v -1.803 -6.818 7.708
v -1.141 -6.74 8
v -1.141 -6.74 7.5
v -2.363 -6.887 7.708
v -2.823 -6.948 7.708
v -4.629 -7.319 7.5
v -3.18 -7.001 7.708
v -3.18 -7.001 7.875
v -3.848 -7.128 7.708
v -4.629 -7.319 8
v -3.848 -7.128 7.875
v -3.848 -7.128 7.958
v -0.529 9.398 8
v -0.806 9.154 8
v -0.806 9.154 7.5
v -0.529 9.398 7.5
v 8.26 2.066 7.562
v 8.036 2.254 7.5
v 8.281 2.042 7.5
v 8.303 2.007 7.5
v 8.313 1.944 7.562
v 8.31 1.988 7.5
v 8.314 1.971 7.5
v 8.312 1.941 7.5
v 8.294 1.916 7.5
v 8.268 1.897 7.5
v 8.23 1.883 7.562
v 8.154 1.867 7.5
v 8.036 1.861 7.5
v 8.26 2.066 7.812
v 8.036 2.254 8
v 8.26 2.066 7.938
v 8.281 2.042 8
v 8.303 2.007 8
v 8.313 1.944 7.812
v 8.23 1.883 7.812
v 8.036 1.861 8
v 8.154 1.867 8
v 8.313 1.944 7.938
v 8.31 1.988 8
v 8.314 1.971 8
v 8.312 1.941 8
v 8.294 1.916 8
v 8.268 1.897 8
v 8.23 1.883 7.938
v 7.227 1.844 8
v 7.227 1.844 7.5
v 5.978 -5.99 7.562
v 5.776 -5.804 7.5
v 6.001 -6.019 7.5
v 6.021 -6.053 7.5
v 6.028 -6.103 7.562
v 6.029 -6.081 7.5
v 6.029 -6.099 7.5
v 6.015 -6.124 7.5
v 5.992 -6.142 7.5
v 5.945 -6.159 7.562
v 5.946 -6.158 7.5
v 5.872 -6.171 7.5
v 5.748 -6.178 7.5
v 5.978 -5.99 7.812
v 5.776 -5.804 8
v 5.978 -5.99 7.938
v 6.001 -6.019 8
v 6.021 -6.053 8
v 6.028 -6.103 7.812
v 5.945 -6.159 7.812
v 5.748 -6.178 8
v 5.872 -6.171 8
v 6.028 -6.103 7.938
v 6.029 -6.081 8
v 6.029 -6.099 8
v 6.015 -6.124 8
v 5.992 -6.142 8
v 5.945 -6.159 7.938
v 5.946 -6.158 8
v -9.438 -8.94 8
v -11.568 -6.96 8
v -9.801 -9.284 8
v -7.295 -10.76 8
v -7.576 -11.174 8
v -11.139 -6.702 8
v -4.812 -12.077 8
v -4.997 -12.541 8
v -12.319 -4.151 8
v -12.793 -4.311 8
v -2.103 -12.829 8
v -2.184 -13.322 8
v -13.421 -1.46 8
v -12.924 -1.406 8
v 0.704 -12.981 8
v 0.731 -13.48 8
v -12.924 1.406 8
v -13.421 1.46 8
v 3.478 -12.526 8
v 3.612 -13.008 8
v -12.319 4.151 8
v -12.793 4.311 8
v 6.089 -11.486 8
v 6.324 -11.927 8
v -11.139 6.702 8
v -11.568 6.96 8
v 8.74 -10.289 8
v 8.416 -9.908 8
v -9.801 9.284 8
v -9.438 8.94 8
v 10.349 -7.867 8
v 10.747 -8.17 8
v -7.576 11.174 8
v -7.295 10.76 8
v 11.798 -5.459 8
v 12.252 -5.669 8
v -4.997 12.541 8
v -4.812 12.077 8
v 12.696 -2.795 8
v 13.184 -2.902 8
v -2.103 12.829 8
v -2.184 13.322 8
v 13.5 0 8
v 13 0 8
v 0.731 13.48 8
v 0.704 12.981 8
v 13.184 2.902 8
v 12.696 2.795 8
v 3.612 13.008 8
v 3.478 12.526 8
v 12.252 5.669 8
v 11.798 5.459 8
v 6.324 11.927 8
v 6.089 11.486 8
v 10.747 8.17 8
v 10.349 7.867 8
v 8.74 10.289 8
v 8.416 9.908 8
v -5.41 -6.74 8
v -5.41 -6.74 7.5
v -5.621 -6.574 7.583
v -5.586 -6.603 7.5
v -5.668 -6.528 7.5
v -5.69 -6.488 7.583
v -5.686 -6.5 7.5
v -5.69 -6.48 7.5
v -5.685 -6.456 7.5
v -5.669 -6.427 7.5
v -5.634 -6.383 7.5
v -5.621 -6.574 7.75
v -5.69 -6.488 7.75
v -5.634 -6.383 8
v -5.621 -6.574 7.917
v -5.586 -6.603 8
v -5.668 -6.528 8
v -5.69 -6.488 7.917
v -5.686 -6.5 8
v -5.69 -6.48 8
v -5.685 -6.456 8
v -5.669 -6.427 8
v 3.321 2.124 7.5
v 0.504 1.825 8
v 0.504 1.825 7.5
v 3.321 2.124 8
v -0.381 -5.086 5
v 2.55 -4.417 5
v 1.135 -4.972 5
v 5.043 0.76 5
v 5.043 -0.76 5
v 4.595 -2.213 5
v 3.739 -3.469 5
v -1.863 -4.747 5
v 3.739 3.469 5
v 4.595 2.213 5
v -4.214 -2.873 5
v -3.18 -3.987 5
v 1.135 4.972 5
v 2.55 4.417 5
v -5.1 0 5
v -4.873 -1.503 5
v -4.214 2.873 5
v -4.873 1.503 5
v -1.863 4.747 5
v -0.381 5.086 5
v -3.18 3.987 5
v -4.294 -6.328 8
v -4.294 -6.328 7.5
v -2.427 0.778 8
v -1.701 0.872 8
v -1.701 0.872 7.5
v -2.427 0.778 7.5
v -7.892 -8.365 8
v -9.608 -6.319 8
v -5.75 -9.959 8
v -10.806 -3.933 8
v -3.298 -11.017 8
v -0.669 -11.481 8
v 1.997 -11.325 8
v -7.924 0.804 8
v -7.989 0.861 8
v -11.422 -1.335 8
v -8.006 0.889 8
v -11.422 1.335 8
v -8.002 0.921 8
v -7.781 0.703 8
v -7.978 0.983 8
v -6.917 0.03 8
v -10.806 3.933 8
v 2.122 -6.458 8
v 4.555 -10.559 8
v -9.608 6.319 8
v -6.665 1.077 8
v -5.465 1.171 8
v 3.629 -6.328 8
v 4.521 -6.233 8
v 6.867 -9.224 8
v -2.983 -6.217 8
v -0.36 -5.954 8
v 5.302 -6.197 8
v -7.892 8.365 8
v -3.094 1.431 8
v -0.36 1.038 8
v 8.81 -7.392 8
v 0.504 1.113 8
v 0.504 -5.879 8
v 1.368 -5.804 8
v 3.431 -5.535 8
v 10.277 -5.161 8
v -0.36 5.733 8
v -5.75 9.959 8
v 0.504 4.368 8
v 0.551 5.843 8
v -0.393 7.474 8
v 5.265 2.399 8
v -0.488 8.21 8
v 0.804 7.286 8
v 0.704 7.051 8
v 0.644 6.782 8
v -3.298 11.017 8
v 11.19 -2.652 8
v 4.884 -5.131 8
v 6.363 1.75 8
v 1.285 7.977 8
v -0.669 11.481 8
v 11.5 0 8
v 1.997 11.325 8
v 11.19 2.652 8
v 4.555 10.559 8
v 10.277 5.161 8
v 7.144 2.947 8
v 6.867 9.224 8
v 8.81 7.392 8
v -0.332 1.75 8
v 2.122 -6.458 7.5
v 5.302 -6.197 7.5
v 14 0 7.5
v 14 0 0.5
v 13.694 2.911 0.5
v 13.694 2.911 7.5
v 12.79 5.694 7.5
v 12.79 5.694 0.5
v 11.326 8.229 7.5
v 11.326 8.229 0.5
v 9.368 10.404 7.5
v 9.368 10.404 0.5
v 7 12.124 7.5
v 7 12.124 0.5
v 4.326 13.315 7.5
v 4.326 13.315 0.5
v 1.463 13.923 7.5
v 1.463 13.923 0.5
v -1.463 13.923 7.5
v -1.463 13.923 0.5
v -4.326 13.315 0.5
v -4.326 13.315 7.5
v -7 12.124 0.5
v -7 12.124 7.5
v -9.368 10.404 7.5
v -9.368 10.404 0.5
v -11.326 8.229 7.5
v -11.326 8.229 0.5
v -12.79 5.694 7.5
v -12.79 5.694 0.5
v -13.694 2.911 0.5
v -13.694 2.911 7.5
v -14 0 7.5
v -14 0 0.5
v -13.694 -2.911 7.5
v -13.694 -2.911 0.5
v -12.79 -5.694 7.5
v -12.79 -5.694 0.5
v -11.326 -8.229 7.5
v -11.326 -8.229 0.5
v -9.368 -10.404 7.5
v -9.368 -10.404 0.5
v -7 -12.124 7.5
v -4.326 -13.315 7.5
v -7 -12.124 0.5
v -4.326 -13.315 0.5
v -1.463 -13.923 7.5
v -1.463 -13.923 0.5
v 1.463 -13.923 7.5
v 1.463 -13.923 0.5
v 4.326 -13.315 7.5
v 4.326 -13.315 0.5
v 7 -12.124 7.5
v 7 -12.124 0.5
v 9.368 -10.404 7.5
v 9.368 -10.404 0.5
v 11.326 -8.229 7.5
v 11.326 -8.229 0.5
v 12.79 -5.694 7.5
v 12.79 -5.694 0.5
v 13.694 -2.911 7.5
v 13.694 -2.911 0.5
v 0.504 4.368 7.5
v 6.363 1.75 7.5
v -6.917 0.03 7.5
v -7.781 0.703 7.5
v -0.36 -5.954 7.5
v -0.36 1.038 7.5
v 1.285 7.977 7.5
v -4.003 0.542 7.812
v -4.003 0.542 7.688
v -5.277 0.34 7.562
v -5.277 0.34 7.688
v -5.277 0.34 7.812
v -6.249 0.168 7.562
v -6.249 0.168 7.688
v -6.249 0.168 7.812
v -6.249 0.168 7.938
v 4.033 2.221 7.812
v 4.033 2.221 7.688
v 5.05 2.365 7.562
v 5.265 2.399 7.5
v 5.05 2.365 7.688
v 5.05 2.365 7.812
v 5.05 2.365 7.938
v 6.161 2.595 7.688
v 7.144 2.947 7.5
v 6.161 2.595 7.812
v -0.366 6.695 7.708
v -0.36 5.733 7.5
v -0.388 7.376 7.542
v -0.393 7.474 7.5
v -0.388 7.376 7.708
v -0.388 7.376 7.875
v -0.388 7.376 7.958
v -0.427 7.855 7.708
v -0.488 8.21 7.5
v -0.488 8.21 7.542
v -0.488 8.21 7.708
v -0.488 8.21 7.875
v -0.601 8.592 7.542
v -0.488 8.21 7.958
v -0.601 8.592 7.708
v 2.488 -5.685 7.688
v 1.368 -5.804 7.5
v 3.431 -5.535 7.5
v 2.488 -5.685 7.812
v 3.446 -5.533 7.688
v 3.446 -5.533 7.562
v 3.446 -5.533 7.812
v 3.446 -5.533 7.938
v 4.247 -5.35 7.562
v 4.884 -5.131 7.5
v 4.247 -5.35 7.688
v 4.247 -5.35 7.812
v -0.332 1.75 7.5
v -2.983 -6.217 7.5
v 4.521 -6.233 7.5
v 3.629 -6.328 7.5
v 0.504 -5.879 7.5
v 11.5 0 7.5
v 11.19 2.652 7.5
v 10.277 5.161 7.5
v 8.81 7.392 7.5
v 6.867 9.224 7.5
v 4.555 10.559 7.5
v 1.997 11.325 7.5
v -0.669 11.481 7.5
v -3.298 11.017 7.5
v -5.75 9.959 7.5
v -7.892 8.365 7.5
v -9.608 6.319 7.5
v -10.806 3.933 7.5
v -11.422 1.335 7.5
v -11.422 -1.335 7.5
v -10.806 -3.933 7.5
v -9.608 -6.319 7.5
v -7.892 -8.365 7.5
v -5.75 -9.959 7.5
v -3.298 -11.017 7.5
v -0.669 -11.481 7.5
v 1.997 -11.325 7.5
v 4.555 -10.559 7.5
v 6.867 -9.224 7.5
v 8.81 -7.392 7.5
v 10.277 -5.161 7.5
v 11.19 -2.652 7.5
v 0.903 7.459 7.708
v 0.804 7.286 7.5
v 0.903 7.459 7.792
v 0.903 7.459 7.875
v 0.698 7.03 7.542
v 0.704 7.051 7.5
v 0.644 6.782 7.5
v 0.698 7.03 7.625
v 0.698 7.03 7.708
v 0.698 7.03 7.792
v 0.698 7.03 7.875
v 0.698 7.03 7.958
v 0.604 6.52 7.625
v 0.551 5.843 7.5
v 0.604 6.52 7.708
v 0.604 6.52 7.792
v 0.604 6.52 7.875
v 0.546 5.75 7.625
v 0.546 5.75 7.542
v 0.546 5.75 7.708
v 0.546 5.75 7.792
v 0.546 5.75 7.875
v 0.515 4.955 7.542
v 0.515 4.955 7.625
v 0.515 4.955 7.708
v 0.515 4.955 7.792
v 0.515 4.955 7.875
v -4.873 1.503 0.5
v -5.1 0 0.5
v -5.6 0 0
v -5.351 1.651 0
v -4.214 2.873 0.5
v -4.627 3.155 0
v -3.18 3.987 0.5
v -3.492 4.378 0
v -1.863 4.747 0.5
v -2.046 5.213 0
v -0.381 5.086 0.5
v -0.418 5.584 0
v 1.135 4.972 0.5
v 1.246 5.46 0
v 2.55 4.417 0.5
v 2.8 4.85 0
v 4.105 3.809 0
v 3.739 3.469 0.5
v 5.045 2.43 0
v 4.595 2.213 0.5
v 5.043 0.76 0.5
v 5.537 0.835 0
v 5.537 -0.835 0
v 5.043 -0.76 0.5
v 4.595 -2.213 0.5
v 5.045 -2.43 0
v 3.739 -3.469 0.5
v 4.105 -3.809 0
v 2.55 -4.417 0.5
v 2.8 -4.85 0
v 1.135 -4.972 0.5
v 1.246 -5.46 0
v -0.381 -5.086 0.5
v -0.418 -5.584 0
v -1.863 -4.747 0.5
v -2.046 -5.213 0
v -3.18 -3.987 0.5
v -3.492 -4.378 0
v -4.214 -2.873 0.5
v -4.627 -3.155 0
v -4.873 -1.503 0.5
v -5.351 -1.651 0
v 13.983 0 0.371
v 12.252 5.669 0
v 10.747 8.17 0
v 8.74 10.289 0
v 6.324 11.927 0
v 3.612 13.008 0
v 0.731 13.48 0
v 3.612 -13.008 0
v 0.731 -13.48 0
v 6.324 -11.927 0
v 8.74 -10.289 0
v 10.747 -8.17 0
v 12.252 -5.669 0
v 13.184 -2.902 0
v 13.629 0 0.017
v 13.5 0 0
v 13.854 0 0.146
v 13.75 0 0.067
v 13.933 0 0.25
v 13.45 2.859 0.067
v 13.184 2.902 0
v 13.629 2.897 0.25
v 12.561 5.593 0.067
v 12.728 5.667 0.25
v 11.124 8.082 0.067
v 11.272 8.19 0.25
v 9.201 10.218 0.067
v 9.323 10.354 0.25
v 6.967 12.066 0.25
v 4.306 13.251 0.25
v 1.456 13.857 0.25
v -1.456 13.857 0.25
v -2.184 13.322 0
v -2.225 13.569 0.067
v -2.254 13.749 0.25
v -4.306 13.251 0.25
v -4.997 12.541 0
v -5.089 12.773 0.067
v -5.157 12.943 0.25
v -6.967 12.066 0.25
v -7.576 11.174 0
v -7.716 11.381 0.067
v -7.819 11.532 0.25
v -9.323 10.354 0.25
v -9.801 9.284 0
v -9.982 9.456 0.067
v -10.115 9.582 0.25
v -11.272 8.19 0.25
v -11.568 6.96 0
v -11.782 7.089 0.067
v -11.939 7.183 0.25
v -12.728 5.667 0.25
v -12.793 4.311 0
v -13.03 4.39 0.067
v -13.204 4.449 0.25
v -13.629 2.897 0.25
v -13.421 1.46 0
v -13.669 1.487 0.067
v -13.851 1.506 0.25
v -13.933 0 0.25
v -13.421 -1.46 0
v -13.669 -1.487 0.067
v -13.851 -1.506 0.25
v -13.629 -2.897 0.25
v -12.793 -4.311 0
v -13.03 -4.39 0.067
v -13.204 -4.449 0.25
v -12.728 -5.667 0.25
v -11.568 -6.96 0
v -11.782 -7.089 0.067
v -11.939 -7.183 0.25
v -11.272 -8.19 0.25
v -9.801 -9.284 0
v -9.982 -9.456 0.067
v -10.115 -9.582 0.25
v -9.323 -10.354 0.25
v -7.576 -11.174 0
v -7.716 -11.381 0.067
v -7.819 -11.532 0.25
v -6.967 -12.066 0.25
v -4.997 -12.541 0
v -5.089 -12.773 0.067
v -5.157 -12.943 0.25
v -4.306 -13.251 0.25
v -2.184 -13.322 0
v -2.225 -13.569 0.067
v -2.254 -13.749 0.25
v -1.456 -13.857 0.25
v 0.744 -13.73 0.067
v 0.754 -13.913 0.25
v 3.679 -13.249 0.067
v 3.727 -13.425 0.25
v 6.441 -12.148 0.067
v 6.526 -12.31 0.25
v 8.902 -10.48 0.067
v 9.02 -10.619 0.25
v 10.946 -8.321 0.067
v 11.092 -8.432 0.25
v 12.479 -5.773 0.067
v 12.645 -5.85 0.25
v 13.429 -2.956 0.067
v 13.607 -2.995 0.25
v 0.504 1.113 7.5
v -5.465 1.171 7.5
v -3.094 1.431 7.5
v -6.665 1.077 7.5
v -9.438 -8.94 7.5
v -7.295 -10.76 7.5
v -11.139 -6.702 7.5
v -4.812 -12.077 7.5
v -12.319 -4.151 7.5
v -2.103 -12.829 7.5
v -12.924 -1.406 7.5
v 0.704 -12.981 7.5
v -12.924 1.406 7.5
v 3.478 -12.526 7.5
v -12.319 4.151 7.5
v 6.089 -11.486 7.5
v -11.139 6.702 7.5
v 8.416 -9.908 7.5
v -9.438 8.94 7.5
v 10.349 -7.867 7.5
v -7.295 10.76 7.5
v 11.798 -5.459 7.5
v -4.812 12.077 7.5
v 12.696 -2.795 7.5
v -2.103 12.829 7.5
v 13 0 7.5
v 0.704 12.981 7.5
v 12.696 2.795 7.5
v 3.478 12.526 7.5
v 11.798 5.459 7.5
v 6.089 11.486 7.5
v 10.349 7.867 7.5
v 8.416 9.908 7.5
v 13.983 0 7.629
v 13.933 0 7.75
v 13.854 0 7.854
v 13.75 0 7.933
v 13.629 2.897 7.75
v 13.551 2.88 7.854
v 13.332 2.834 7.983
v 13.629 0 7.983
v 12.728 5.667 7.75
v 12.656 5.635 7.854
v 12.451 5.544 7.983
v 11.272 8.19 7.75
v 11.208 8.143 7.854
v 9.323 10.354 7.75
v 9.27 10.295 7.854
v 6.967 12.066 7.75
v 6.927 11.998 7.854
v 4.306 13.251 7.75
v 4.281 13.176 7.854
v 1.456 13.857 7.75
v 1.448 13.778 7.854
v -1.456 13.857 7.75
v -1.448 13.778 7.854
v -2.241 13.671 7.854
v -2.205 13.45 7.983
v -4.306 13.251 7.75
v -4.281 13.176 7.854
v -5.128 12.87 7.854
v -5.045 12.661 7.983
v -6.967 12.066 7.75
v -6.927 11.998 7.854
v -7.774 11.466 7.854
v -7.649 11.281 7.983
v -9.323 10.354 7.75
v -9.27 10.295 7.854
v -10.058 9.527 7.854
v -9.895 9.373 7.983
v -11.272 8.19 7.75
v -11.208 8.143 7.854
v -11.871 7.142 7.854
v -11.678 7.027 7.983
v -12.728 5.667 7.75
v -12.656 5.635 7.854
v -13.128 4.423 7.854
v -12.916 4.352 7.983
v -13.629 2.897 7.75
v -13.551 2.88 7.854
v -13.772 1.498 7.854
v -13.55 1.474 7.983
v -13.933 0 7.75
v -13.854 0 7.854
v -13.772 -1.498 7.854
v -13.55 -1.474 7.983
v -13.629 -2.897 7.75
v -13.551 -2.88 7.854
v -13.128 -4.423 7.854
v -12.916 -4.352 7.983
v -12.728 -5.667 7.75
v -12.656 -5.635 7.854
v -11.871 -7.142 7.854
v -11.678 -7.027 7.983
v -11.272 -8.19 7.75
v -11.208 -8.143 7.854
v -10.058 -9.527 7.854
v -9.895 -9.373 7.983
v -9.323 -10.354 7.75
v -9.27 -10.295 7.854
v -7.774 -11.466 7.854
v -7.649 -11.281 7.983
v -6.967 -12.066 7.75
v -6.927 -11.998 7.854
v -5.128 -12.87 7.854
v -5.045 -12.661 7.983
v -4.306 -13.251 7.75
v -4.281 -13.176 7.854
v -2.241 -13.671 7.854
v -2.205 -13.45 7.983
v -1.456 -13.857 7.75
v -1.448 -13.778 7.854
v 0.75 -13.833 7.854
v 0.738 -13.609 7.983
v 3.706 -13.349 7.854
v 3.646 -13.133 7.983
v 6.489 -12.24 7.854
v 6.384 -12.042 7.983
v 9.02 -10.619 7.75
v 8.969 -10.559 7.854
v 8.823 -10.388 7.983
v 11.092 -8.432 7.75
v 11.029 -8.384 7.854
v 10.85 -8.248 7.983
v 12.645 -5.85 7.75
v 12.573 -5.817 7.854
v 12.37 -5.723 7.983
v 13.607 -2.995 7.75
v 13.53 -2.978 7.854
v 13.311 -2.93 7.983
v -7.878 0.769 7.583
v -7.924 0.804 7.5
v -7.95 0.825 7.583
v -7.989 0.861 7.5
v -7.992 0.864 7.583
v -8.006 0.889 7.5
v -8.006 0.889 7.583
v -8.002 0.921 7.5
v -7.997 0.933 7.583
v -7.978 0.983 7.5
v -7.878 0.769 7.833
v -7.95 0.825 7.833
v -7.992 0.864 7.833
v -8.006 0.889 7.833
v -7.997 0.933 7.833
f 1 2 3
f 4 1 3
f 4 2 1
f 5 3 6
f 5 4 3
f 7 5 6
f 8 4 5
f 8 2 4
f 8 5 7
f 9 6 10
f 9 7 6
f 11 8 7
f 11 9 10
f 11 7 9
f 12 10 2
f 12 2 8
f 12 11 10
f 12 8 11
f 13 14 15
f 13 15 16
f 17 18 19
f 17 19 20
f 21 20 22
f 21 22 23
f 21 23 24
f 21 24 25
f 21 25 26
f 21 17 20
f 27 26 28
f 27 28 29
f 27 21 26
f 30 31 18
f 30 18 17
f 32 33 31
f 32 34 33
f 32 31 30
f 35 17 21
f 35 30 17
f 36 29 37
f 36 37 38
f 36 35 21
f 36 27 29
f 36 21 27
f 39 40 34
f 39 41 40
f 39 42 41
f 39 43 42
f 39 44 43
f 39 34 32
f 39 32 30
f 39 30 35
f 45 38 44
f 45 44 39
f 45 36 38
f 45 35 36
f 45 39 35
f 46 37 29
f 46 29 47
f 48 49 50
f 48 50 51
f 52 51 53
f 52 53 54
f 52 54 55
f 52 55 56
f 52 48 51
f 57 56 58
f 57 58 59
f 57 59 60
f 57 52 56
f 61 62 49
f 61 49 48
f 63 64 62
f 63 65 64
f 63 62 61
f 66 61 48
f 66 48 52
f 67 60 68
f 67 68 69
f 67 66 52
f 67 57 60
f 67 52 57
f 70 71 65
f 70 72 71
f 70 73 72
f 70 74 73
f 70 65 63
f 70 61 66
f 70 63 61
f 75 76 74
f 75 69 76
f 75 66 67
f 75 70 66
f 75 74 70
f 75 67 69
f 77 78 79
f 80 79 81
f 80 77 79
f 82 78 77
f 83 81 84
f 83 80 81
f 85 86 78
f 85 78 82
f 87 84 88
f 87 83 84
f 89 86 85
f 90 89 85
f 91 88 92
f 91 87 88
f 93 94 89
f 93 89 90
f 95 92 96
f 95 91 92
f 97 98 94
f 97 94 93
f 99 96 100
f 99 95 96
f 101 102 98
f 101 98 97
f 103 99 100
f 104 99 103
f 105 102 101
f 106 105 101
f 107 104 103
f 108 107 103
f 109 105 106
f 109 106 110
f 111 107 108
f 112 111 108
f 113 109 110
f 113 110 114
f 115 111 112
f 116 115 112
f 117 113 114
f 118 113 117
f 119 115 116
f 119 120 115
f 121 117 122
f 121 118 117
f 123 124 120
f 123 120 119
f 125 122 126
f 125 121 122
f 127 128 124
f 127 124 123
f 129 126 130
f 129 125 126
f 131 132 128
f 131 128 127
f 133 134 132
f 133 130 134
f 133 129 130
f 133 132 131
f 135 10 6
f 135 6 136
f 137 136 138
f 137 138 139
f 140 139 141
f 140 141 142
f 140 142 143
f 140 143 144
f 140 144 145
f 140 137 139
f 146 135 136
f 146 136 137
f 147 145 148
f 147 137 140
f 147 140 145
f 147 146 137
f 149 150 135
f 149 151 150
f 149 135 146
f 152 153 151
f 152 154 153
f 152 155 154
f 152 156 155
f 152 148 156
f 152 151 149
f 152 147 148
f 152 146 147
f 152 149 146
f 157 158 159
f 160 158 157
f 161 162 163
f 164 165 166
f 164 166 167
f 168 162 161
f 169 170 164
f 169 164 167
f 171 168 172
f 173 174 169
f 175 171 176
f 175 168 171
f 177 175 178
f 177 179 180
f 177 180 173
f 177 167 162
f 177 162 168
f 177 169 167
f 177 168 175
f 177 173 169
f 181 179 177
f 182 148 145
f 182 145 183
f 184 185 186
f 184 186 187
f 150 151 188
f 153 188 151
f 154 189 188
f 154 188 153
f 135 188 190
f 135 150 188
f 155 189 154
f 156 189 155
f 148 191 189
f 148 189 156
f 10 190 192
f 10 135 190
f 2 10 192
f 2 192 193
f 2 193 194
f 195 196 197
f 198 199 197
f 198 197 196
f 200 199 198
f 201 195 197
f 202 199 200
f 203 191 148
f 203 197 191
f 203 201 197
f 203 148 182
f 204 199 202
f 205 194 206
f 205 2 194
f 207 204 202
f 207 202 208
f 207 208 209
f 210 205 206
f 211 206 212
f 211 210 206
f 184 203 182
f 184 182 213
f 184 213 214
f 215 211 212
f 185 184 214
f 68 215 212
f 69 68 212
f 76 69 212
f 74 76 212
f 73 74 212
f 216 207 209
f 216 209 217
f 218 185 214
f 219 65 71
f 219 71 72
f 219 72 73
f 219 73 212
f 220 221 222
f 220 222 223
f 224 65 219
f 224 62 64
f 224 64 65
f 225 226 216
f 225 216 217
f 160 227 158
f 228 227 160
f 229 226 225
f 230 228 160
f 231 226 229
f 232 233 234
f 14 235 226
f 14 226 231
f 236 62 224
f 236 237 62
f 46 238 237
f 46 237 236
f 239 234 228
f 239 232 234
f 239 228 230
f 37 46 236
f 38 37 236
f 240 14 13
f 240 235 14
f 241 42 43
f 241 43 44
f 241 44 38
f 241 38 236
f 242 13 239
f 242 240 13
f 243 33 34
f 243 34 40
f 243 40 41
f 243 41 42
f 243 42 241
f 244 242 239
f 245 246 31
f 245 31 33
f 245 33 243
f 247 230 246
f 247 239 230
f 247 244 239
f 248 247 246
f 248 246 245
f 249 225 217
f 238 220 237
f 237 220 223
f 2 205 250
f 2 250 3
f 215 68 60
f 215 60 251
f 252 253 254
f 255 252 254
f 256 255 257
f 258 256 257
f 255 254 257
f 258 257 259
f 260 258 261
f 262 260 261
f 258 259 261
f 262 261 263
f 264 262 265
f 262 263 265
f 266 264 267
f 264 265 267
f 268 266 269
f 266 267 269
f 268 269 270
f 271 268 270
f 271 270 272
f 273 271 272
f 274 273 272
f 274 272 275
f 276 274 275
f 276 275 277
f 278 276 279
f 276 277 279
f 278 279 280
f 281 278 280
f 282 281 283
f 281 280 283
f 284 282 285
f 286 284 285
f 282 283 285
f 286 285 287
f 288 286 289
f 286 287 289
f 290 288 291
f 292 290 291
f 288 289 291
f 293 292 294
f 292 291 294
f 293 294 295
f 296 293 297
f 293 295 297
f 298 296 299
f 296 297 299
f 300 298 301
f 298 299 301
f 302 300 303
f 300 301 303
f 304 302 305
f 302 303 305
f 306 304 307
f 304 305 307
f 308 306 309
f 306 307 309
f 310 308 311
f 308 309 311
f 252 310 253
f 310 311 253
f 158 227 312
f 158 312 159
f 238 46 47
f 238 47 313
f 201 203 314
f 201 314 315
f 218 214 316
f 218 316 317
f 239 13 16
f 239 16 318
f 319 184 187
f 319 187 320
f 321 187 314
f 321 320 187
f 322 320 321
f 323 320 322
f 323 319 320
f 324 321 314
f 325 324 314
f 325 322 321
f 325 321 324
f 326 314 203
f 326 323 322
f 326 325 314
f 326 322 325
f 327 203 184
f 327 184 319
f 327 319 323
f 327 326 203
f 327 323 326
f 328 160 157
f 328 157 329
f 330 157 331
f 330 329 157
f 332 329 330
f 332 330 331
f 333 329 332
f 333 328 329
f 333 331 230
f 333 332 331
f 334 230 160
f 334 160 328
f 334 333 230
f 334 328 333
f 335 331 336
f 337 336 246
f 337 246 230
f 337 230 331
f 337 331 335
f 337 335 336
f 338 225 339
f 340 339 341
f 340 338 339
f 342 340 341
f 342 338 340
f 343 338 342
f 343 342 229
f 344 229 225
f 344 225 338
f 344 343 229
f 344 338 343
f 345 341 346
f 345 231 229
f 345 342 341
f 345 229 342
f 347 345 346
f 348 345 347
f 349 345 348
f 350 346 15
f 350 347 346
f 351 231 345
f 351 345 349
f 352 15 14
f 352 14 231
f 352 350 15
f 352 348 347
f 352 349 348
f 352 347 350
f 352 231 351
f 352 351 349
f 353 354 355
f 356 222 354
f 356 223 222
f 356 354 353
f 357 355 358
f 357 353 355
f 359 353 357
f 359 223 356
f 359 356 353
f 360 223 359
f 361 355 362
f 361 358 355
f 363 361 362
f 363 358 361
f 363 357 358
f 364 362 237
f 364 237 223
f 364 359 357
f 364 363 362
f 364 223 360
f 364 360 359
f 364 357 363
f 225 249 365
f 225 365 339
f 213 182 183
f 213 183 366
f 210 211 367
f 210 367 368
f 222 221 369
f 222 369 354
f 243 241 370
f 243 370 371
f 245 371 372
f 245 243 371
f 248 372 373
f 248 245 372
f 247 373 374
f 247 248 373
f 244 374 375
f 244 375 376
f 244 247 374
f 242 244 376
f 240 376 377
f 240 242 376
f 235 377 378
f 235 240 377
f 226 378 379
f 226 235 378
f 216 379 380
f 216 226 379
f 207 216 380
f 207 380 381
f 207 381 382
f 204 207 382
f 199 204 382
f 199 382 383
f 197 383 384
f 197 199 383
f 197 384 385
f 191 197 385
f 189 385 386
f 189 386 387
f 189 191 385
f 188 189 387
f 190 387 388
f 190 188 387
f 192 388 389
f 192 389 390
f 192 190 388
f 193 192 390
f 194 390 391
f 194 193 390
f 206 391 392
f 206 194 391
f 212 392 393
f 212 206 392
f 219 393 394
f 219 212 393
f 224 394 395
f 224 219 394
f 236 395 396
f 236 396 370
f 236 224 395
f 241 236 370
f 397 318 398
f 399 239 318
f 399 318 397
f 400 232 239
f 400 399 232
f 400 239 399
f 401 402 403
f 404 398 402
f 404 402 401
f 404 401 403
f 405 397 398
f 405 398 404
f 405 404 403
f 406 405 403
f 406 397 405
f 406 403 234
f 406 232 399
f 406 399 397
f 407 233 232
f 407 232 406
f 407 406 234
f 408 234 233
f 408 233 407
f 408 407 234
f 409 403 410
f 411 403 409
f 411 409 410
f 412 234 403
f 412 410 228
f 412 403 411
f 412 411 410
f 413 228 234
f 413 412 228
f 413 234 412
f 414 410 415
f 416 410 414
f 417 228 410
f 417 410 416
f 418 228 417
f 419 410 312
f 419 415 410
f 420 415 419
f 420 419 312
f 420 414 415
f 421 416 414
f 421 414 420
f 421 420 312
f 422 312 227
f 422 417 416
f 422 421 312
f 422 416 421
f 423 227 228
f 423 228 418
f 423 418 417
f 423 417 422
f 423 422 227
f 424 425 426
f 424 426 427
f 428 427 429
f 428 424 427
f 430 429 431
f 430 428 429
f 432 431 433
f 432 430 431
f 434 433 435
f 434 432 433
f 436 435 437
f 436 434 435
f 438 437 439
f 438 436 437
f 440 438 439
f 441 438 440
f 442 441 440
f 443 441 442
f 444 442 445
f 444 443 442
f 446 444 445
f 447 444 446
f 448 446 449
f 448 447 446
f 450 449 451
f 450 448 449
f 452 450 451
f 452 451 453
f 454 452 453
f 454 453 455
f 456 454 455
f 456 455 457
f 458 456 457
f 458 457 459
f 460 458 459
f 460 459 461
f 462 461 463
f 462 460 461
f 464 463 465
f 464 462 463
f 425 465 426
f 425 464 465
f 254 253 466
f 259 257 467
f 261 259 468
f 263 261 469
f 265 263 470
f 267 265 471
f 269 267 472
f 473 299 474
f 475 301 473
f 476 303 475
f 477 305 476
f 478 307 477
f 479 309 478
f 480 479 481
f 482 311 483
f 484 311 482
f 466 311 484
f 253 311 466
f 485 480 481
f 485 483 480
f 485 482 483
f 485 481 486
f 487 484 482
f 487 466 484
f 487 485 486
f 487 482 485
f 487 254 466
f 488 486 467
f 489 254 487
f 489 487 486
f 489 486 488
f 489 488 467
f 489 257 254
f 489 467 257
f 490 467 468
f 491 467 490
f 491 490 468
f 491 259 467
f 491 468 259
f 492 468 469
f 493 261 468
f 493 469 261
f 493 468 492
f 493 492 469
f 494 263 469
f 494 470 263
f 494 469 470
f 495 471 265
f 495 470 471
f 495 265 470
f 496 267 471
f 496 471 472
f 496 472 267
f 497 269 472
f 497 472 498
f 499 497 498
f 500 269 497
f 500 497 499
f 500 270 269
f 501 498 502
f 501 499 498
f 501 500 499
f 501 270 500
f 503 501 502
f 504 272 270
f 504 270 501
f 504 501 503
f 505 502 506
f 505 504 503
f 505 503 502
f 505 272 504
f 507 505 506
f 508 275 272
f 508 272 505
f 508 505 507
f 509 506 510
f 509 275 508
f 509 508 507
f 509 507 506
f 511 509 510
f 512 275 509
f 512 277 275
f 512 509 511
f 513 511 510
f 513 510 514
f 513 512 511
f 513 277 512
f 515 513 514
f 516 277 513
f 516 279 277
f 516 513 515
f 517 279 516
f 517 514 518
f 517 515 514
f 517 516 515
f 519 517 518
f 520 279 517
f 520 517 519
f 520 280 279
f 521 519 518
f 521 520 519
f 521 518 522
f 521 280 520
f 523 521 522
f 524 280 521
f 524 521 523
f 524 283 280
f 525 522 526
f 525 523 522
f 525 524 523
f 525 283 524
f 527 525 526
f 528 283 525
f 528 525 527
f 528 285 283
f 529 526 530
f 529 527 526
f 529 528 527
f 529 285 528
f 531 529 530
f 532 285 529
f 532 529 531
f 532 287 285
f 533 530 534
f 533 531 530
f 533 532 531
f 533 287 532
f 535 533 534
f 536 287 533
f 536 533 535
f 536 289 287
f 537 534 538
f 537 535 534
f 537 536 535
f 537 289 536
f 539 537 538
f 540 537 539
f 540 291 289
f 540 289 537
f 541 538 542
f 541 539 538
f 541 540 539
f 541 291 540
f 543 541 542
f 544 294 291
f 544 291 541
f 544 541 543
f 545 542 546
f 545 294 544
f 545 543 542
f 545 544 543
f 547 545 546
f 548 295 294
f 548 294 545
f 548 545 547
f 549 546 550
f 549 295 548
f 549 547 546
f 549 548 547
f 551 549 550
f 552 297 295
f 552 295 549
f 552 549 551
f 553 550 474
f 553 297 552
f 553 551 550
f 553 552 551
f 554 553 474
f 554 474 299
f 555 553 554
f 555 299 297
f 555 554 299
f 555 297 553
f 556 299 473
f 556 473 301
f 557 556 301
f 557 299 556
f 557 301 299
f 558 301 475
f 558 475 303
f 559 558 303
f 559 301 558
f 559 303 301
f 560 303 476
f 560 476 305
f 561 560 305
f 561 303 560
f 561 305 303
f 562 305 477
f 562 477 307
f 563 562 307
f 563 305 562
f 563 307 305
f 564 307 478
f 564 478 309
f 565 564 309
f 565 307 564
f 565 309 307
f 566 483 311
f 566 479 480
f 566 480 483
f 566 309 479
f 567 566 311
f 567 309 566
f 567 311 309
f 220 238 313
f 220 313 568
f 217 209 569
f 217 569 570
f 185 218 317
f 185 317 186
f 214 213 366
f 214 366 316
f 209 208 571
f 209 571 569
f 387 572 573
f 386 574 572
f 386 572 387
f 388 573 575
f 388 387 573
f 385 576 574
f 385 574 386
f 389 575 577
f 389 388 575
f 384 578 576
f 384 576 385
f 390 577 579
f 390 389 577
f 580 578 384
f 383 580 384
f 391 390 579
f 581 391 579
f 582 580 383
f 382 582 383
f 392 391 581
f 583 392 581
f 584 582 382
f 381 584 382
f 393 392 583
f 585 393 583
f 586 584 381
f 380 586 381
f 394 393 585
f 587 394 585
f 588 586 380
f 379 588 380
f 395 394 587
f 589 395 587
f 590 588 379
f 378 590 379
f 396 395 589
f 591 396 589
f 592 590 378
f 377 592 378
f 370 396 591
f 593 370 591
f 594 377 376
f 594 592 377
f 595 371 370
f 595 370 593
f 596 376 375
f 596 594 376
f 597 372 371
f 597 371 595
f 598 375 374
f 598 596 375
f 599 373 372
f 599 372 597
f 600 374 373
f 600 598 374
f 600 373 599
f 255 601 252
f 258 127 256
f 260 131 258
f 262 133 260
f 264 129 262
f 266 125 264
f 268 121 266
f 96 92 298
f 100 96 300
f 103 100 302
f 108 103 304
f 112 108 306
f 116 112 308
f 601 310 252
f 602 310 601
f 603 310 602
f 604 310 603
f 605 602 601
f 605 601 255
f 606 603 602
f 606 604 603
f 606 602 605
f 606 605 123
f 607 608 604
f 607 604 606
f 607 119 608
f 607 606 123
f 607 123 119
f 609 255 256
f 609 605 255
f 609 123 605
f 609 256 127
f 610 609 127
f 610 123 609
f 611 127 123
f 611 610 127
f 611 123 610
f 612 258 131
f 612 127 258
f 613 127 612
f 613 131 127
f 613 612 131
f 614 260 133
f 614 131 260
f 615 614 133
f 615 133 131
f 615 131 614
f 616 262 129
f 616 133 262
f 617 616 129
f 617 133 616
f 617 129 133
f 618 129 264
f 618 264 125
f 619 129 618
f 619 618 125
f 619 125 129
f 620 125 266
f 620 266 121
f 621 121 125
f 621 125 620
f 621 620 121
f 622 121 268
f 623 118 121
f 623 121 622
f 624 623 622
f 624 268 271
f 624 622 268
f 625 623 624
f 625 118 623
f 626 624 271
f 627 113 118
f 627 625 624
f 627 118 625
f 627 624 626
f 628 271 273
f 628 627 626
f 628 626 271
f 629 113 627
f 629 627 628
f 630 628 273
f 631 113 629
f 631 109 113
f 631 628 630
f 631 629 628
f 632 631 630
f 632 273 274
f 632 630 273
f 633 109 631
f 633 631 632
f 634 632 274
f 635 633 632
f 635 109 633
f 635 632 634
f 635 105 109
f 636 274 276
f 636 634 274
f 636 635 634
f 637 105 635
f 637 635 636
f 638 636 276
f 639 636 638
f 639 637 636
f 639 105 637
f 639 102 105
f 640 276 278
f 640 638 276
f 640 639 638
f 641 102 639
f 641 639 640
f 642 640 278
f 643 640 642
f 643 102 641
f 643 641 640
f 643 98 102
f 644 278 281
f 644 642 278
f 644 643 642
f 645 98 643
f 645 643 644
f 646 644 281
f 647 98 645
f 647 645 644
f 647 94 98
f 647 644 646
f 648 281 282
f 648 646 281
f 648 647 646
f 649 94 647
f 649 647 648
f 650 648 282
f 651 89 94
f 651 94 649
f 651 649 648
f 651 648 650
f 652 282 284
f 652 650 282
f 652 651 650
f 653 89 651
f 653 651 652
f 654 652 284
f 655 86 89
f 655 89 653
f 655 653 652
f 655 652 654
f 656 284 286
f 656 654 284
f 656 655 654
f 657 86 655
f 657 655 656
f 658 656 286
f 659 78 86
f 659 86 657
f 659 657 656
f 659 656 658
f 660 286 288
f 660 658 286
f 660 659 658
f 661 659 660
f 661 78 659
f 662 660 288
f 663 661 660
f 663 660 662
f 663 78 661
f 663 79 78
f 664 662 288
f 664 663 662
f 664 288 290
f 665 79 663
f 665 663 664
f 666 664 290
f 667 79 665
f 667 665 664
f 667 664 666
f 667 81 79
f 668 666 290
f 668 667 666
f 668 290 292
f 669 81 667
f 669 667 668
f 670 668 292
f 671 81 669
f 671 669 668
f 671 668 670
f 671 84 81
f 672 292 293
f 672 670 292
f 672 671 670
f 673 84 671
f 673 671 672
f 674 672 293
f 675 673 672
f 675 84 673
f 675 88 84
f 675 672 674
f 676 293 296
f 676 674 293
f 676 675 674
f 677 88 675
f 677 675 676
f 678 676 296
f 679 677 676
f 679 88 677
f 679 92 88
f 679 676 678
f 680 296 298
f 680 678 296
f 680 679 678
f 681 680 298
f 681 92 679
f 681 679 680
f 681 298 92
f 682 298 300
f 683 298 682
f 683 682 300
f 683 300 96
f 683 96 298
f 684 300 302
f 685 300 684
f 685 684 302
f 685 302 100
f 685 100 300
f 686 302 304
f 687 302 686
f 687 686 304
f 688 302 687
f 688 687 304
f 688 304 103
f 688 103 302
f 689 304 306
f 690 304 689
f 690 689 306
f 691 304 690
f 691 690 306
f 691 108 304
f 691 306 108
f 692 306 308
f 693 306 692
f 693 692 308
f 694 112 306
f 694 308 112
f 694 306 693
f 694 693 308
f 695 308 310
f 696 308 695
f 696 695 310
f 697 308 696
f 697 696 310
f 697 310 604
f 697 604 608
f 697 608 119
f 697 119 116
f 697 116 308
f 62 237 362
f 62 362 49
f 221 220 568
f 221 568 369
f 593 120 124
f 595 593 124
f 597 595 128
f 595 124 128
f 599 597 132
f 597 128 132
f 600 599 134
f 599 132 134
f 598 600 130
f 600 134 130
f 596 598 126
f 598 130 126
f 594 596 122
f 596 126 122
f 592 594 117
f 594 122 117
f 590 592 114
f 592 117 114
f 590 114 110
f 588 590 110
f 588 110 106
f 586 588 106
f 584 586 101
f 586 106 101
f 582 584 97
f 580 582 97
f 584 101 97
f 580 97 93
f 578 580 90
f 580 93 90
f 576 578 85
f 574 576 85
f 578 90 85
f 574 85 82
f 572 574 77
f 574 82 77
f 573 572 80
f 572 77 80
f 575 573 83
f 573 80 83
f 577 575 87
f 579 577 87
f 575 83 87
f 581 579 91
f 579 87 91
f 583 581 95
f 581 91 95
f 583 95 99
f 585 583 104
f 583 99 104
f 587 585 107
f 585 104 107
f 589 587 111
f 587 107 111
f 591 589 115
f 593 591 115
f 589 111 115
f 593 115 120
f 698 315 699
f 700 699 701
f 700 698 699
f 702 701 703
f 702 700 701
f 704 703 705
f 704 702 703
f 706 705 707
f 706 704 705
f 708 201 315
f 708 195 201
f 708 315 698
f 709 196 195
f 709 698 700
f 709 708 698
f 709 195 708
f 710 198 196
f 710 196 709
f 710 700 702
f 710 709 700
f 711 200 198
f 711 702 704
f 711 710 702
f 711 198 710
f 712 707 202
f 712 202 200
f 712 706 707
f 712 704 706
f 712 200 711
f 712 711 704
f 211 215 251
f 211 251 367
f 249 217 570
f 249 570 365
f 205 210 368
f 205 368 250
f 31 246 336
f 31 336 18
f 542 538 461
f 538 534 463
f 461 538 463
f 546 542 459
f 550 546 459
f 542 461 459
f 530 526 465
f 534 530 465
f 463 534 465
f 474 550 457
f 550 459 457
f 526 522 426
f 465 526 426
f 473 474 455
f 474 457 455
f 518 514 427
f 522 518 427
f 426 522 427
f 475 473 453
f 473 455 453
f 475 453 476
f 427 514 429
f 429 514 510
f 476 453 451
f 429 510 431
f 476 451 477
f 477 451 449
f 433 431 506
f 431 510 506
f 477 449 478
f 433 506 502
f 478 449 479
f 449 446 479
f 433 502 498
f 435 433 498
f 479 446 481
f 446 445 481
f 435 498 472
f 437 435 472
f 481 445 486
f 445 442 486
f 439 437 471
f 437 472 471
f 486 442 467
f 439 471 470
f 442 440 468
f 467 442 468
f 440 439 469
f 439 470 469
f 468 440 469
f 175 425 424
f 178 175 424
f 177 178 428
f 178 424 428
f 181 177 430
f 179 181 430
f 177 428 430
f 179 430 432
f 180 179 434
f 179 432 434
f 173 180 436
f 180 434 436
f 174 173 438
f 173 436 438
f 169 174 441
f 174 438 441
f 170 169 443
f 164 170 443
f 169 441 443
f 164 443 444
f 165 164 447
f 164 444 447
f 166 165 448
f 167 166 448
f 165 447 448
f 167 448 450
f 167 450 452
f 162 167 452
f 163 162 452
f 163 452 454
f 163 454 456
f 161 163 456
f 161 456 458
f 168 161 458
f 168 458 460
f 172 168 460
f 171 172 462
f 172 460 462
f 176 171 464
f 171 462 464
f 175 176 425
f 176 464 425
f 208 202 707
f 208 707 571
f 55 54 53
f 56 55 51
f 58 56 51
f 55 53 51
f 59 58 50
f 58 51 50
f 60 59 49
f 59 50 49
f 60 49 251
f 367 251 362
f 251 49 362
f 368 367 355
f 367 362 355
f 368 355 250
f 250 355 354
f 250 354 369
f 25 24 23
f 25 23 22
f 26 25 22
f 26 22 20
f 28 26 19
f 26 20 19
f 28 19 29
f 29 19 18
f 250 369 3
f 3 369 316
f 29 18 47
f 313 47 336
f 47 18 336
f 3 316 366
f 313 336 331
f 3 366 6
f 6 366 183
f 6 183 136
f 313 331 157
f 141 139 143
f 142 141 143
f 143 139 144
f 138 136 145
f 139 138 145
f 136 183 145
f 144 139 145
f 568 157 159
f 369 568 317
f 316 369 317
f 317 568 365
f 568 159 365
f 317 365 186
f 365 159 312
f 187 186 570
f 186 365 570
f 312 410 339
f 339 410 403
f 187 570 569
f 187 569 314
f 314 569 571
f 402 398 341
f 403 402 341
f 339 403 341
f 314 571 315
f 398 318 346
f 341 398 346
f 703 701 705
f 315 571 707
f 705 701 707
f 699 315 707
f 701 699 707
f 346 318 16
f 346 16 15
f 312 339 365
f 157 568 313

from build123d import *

# Parameters (mm, degrees)
SKETCH_1_R          = 14
EXTRUDE_1_DEPTH     = 8
SKETCH_2_R          = 13
SKETCH_2_R_2        = 11.5
CUT_EXTRUDE_1_DEPTH = 0.5
SKETCH_3_R          = 5.1
CUT_EXTRUDE_2_DEPTH = 5
CHAMFER_1_SIZE      = 0.5
FILLET_1_R          = 0.5
CUT_EXTRUDE_3_DEPTH = 0.5


with BuildPart() as part:
    # 草图1 → 凸台-拉伸1 (new body)
    with BuildSketch(Plane.XY):
        Circle(SKETCH_1_R)
    extrude(amount=EXTRUDE_1_DEPTH)

    # 草图2 → 切除-拉伸1 (cut)
    with BuildSketch(Plane.XY.offset(8)):
        Circle(SKETCH_2_R)
        Circle(SKETCH_2_R_2, mode=Mode.SUBTRACT)
    extrude(amount=-CUT_EXTRUDE_1_DEPTH, mode=Mode.SUBTRACT)

    # 草图3 → 切除-拉伸2 (cut)
    with BuildSketch(Plane(origin=(0, 0, 0), x_dir=(-1, 0, 0), z_dir=(0, 0, -1))):
        Circle(SKETCH_3_R)
    extrude(amount=-CUT_EXTRUDE_2_DEPTH, mode=Mode.SUBTRACT)

    # 倒角1
    chamfer_1_edges = [part.edges().sort_by_distance(p)[0] for p in [
        (5.1, 0, 0),
    ]]
    chamfer(chamfer_1_edges, length=CHAMFER_1_SIZE)

    # 圆角1
    fillet_1_edges = [part.edges().sort_by_distance(p)[0] for p in [
        (-14, 0, 0),
        (-14, 0, 8),
    ]]
    fillet(fillet_1_edges, radius=FILLET_1_R)

    # 草图4 → 切除-拉伸3 (cut)
    with BuildSketch(Plane.XY.offset(8)):
        with BuildLine():
            Line((-0.332439592, 1.750042466), (-0.360140423, 5.733421968))
            add(Edge.make_bspline(
                [(-0.360140423, 5.733421968), (-0.361352645, 5.905161235), (-0.363614161, 6.225557253), (-0.362563714, 6.6716641), (-0.376473853, 7.047374008), (-0.385330649, 7.359666935), (-0.402429288, 7.62108814), (-0.424047197, 7.845666351), (-0.450655997, 8.039057288), (-0.486147264, 8.214138322), (-0.538863863, 8.394313463), (-0.604319105, 8.608623265), (-0.69811297, 8.866152605), (-0.768099985, 9.052974569), (-0.806123802, 9.154474599)],
                knots=[0, 0, 0, 0, 1.776080644, 3.313448207, 4.612630616, 5.663679929, 6.544024972, 7.321231433, 7.996425259, 8.561978184, 9.16664432, 9.936779763, 10.879056232, 12, 12, 12, 12], degree=3))
            Line((-0.806123802, 9.154474599), (-0.529115492, 9.398241912))
            Line((-0.529115492, 9.398241912), (1.28528894, 7.977189281))
            add(Edge.make_bspline(
                [(1.28528894, 7.977189281), (1.212689416, 7.888764213), (1.076355109, 7.72271119), (0.907905181, 7.473619686), (0.778857884, 7.248302871), (0.690090199, 7.028698577), (0.643415827, 6.786186198), (0.597023873, 6.498405776), (0.567426595, 6.145605356), (0.545007238, 5.747427005), (0.525356606, 5.343894899), (0.516092277, 4.972576481), (0.505970295, 4.653140232), (0.504704552, 4.457343357), (0.504125505, 4.367770998)],
                knots=[0, 0, 0, 0, 1.084774512, 2.037092997, 2.848708899, 3.544871268, 4.271658147, 5.184656451, 6.310726112, 7.626940673, 8.968471314, 10.142701689, 11.150330718, 12, 12, 12, 12], degree=3))
            Line((0.504125505, 4.367770998), (0.504125505, 1.82483471))
            Line((0.504125505, 1.82483471), (3.321300021, 2.124003685))
            add(Edge.make_bspline(
                [(3.321300021, 2.124003685), (3.42652928, 2.139025527), (3.663624238, 2.172871655), (4.057608853, 2.222727844), (4.527947814, 2.292502711), (5.058622387, 2.362973897), (5.614072784, 2.456659085), (6.154444434, 2.587180098), (6.664734902, 2.745631608), (6.986142322, 2.880481389), (7.144014702, 2.946718367)],
                knots=[0, 0, 0, 0, 0.649902526, 1.464313377, 2.427986904, 3.556930783, 4.73754275, 5.869953849, 6.953740843, 8, 8, 8, 8], degree=3))
            Line((7.144014702, 2.946718367), (8.035981461, 2.254197591))
            add(Edge.make_bspline(
                [(8.035981461, 2.254197591), (8.080959366, 2.220886663), (8.159539314, 2.162689843), (8.252827302, 2.077830082), (8.307983989, 2.009717031), (8.321391828, 1.94420007), (8.283079852, 1.900605024), (8.222569166, 1.879078168), (8.138400359, 1.862528273), (8.073037414, 1.861454526), (8.035981461, 1.86084579)],
                knots=[0, 0, 0, 0, 1.835156804, 3.206163717, 4.12161621, 4.700123913, 5.196760664, 5.860863374, 6.787267836, 8, 8, 8, 8], degree=3))
            Line((8.035981461, 1.86084579), (7.227117195, 1.844225292))
            Line((7.227117195, 1.844225292), (6.362851267, 1.750042466))
            Line((6.362851267, 1.750042466), (0.504125505, 1.112923353))
            Line((0.504125505, 1.112923353), (0.504125505, -5.878766398))
            Line((0.504125505, -5.878766398), (1.368391433, -5.803974154))
            add(Edge.make_bspline(
                [(1.368391433, -5.803974154), (1.561462147, -5.786385303), (1.935094465, -5.752347189), (2.474534057, -5.688787282), (2.974290009, -5.617039302), (3.434533274, -5.537557716), (3.854668132, -5.448672356), (4.23555044, -5.356628694), (4.575244967, -5.252223674), (4.784345257, -5.169921401), (4.88362689, -5.13084396)],
                knots=[0, 0, 0, 0, 1.29553906, 2.507139754, 3.629368228, 4.669195067, 5.627680362, 6.498691998, 7.287173099, 8, 8, 8, 8], degree=3))
            Line((4.88362689, -5.13084396), (5.775593649, -5.803974154))
            add(Edge.make_bspline(
                [(5.775593649, -5.803974154), (5.817072398, -5.83713927), (5.888656192, -5.894375444), (5.971238583, -5.979775819), (6.02161762, -6.04253168), (6.035824152, -6.104047047), (5.996806703, -6.143717178), (5.936119537, -6.162435734), (5.850855599, -6.175102485), (5.784876091, -6.176917826), (5.747892818, -6.177935373)],
                knots=[0, 0, 0, 0, 1.812194932, 3.127475989, 4.036720824, 4.576297278, 5.068692798, 5.747705924, 6.737529143, 8, 8, 8, 8], degree=3))
            Line((5.747892818, -6.177935373), (5.301909439, -6.197325955))
            Line((5.301909439, -6.197325955), (4.520746004, -6.233337035))
            Line((4.520746004, -6.233337035), (3.628779245, -6.327519861))
            Line((3.628779245, -6.327519861), (2.121854037, -6.457713766))
            Line((2.121854037, -6.457713766), (-1.141303857, -6.740262243))
            add(Edge.make_bspline(
                [(-1.141303857, -6.740262243), (-1.255758527, -6.754469707), (-1.47626363, -6.781841404), (-1.794394083, -6.815523946), (-2.0867365, -6.853615725), (-2.354021003, -6.884446926), (-2.596232118, -6.920650211), (-2.813843434, -6.945556544), (-3.005595903, -6.974642338), (-3.23226146, -7.007828608), (-3.510911328, -7.055457968), (-3.858422546, -7.129968972), (-4.235310728, -7.213583069), (-4.494280475, -7.283092979), (-4.628838483, -7.319209611)],
                knots=[0, 0, 0, 0, 1.173024538, 2.259915622, 3.253542956, 4.171454364, 4.996242764, 5.744084598, 6.39886201, 6.968650651, 8.074127918, 9.273179876, 10.583172403, 12, 12, 12, 12], degree=3))
            Line((-4.628838483, -7.319209611), (-5.410001918, -6.740262243))
            add(Edge.make_bspline(
                [(-5.410001918, -6.740262243), (-5.450722452, -6.709069955), (-5.521636813, -6.654748927), (-5.61115149, -6.583007343), (-5.666823555, -6.533702581), (-5.697711988, -6.484415815), (-5.674943077, -6.430258701), (-5.649144053, -6.4001522), (-5.63437865, -6.382921523)],
                knots=[0, 0, 0, 0, 1.845274552, 3.213525351, 4.10520704, 4.550429949, 5.170376093, 6, 6, 6, 6], degree=3))
            Line((-5.63437865, -6.382921523), (-4.293658428, -6.327519861))
            Line((-4.293658428, -6.327519861), (-2.983409121, -6.216716536))
            Line((-2.983409121, -6.216716536), (-0.360140423, -5.953558642))
            Line((-0.360140423, -5.953558642), (-0.360140423, 1.038131109))
            Line((-0.360140423, 1.038131109), (-1.700860644, 0.871926123))
            Line((-1.700860644, 0.871926123), (-2.426622417, 0.777743297))
            add(Edge.make_bspline(
                [(-2.426622417, 0.777743297), (-2.701812878, 0.737311731), (-3.227393674, 0.660092285), (-3.978116975, 0.546657661), (-4.653090311, 0.441375307), (-5.252805162, 0.34603544), (-5.775671732, 0.252487806), (-6.224429528, 0.175191604), (-6.596059424, 0.099410354), (-6.818167512, 0.051239755), (-6.916927126, 0.02982086)],
                knots=[0, 0, 0, 0, 1.466159973, 2.800189808, 4.002110139, 5.067144397, 6.000968071, 6.801993663, 7.467310513, 8, 8, 8, 8], degree=3))
            Line((-6.916927126, 0.02982086), (-7.781193054, 0.702951054))
            add(Edge.make_bspline(
                [(-7.781193054, 0.702951054), (-7.813806148, 0.724644837), (-7.87162741, 0.763106747), (-7.941670689, 0.817660634), (-7.986665168, 0.854457065), (-8.012472353, 0.892884107), (-7.995931201, 0.936594338), (-7.984222445, 0.966501178), (-7.977868954, 0.982729447)],
                knots=[0, 0, 0, 0, 1.797637159, 3.187114011, 4.056246988, 4.492359064, 5.181912803, 6, 6, 6, 6], degree=3))
            Line((-7.977868954, 0.982729447), (-6.664849564, 1.076912272))
            Line((-6.664849564, 1.076912272), (-5.46540358, 1.171095098))
            Line((-5.46540358, 1.171095098), (-3.094212445, 1.431482909))
            Line((-3.094212445, 1.431482909), (-0.332439592, 1.750042466))
        make_face()
    extrude(amount=-CUT_EXTRUDE_3_DEPTH, mode=Mode.SUBTRACT)


solid = part.part
